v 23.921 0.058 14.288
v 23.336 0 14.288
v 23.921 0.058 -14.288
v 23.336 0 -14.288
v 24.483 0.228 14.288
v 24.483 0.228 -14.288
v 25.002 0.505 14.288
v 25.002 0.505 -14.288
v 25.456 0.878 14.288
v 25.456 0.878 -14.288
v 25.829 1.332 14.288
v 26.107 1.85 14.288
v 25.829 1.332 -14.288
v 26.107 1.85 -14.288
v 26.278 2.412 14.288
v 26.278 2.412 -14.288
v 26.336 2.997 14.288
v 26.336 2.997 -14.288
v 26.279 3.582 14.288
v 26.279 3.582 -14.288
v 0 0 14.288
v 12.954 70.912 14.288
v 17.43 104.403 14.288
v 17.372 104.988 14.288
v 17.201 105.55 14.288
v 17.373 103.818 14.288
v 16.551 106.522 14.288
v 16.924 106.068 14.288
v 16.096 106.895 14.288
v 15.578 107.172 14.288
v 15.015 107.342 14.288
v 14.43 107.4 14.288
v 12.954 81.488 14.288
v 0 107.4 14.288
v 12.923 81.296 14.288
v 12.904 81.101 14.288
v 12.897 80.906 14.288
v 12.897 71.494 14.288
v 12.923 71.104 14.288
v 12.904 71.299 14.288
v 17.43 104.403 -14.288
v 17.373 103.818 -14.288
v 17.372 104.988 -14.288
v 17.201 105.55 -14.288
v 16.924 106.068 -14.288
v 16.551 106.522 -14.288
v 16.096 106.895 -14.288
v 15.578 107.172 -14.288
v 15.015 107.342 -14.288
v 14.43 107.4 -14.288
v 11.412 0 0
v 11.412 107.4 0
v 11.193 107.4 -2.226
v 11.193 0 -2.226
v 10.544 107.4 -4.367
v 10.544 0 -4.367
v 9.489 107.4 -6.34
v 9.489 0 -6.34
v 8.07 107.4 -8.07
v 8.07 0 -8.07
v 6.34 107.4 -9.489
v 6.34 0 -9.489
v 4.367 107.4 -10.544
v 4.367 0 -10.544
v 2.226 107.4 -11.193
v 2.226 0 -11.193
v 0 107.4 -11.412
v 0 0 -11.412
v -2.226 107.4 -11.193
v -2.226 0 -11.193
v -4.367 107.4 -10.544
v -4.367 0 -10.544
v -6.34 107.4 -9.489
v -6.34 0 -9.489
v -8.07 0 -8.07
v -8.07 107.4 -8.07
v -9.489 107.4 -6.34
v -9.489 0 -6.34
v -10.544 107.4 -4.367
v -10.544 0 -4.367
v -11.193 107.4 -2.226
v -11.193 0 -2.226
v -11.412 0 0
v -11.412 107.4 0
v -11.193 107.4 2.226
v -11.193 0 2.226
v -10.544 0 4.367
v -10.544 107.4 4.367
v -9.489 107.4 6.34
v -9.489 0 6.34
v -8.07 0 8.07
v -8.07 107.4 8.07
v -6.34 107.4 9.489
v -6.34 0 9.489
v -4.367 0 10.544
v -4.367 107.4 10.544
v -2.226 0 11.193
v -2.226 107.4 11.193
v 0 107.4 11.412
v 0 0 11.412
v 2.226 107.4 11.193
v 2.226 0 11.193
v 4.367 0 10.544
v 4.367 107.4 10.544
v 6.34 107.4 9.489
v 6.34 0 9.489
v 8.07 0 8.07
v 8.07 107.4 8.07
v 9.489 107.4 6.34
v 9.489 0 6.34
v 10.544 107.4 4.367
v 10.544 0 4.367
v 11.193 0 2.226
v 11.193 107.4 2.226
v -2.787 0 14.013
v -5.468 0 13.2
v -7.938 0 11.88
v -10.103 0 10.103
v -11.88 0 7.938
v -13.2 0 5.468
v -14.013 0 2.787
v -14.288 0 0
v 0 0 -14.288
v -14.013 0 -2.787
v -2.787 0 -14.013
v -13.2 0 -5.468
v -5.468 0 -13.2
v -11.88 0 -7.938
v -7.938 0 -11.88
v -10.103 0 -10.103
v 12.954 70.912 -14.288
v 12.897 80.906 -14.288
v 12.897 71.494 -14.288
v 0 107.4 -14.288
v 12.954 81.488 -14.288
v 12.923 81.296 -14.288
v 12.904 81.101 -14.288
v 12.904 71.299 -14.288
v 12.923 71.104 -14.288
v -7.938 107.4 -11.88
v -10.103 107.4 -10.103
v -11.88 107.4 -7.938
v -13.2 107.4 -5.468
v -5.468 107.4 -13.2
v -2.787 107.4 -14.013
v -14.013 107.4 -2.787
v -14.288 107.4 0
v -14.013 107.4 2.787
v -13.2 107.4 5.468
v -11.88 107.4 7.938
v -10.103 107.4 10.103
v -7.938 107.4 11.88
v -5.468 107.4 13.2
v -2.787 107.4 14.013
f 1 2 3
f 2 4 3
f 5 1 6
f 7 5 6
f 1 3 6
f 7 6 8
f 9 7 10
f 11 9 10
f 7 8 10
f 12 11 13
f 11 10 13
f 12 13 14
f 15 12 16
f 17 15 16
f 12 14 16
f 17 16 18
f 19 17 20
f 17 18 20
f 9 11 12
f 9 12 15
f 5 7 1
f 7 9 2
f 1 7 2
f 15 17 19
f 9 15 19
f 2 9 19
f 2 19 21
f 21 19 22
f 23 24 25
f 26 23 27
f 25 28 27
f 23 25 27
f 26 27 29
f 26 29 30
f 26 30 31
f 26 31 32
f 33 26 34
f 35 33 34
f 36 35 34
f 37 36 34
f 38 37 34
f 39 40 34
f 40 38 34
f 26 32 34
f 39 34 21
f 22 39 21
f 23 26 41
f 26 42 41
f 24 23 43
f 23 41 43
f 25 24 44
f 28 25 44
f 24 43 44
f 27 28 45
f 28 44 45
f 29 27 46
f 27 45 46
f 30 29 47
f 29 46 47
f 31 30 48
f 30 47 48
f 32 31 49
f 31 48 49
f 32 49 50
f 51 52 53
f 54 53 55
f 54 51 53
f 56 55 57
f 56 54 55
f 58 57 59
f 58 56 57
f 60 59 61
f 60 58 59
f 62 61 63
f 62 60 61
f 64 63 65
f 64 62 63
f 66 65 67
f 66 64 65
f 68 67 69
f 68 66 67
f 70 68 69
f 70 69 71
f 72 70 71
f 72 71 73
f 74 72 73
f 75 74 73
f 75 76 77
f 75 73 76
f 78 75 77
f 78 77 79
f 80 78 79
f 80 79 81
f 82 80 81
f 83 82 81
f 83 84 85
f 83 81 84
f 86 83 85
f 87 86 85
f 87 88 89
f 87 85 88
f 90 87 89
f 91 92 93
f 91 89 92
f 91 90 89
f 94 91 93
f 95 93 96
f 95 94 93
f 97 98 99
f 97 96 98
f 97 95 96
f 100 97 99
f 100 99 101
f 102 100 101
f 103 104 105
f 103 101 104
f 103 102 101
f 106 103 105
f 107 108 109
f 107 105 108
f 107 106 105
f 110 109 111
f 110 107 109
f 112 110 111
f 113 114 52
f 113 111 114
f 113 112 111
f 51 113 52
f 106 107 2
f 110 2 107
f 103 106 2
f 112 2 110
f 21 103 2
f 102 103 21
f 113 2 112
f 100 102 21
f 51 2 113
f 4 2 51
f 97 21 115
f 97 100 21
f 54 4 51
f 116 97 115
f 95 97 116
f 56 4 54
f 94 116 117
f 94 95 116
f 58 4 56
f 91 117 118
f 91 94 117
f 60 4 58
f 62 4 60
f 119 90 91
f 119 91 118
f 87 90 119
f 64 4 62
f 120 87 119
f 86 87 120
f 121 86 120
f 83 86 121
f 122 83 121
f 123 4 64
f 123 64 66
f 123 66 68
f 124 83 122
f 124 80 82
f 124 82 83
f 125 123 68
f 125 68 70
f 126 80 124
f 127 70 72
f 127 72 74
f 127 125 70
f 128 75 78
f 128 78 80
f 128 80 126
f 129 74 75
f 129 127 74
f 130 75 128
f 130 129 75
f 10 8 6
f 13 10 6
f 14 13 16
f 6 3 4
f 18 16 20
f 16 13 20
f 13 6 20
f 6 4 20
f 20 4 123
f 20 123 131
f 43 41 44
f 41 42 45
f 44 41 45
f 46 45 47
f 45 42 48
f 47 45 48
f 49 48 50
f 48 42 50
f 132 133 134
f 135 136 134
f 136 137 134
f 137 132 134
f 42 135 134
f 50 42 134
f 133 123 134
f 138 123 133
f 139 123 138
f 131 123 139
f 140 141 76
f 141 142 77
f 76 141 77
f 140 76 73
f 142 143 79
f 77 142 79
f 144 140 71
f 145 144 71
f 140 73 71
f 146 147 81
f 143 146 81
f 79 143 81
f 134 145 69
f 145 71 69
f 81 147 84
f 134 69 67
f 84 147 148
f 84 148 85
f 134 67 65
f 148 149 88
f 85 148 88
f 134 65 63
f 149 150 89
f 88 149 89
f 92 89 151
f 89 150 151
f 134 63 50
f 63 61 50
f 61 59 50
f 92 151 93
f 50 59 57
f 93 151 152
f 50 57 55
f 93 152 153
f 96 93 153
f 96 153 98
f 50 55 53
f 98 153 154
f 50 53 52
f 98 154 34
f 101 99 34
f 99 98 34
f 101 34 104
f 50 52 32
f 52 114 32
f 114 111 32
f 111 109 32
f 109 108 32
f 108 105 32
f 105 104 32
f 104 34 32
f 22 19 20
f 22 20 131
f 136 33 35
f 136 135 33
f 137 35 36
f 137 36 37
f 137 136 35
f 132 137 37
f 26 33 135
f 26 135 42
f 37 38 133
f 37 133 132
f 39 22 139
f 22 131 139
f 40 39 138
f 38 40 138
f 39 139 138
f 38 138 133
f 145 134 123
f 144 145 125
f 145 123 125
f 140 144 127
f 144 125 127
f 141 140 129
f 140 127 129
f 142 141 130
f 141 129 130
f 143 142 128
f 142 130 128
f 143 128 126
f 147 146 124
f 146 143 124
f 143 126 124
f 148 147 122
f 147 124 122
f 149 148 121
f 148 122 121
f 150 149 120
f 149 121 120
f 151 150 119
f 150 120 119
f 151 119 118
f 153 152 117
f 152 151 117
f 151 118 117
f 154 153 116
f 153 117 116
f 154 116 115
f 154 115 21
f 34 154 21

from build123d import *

# Parameters (mm, degrees)
SKETCH1_R           = 14.2875
SKETCH1_R_2         = 11.4125
BOSS_EXTRUDE1_DEPTH = 152.4
SKETCH2_W           = 28.575
SKETCH2_H           = 152.4
BOSS_EXTRUDE2_DEPTH = 12.7
BOSS_EXTRUDE3_DEPTH = 152.4
CUT_EXTRUDE1_DEPTH  = 29.575
FILLET1_R           = 3
SKETCH6_W           = 50
SKETCH6_H           = 45
CUT_EXTRUDE2_DEPTH  = 82
FILLET2_R           = 3


with BuildPart() as part:
    # Sketch1 → Boss-Extrude1 (new body)
    with BuildSketch(Plane(origin=(0, 0, 0), x_dir=(1, 0, 0), z_dir=(0, 1, 0))):
        Circle(SKETCH1_R)
        Circle(SKETCH1_R_2, mode=Mode.SUBTRACT)
    extrude(amount=BOSS_EXTRUDE1_DEPTH)



with BuildPart() as body_2:
    # Sketch2 → Boss-Extrude2 (new body)
    with BuildSketch(Plane(origin=(14.2875, 0, 0), x_dir=(0, 0, -1), z_dir=(1, 0, 0))):
        with Locations((0, 76.2)):
            Rectangle(SKETCH2_W, SKETCH2_H)
    extrude(amount=BOSS_EXTRUDE2_DEPTH)


with BuildPart() as part_1:
    add(part.part)

    add(body_2.part)  # Boss-Extrude3 merges body 2
    # Sketch3 → Boss-Extrude3 (add, through all)
    with BuildSketch(Plane(origin=(0, 152.4, 0), x_dir=(1, 0, 0), z_dir=(0, 1, 0))):
        with BuildLine():
            Line((14.2875, -14.2875), (0, -14.2875))
            ThreePointArc((0, -14.2875), (14.2875, 0), (0, 14.2875))
            Line((0, 14.2875), (14.2875, 14.2875))
            Line((14.2875, 14.2875), (26.9875, 14.2875))
            Line((26.9875, 14.2875), (26.9875, -14.2875))
            Line((26.9875, -14.2875), (14.2875, -14.2875))
        make_face()
    extrude(amount=-BOSS_EXTRUDE3_DEPTH)

    # Sketch5 → Cut-Extrude1 (cut, through all)
    with BuildSketch(Plane.XY.offset(14.2875)):
        Polygon((26.9875, 0), (12.897222949, 71.2), (12.897222949, 81.2), (26.9875, 152.4), align=None)
    extrude(amount=-CUT_EXTRUDE1_DEPTH, mode=Mode.SUBTRACT)

    # Fillet1
    fillet1_edges = [part_1.edges().sort_by_distance(p)[0] for p in [
        (26.9875, 0, 0),
        (26.9875, 152.4, 0),
        (12.897222949, 71.2, 0),
        (12.897222949, 81.2, 0),
    ]]
    fillet(fillet1_edges, radius=FILLET1_R)

    # Sketch6 → Cut-Extrude2 (cut)
    with BuildSketch(Plane.XY.offset(14.2875)):
        with Locations((9.7125, 129.9)):
            Rectangle(SKETCH6_W, SKETCH6_H)
    extrude(amount=-CUT_EXTRUDE2_DEPTH, mode=Mode.SUBTRACT)

    # Fillet2
    fillet2_edges = [part_1.edges().sort_by_distance(p)[0] for p in [
        (18.082128268, 107.4, 0),
    ]]
    fillet(fillet2_edges, radius=FILLET2_R)


solid = part_1.part
